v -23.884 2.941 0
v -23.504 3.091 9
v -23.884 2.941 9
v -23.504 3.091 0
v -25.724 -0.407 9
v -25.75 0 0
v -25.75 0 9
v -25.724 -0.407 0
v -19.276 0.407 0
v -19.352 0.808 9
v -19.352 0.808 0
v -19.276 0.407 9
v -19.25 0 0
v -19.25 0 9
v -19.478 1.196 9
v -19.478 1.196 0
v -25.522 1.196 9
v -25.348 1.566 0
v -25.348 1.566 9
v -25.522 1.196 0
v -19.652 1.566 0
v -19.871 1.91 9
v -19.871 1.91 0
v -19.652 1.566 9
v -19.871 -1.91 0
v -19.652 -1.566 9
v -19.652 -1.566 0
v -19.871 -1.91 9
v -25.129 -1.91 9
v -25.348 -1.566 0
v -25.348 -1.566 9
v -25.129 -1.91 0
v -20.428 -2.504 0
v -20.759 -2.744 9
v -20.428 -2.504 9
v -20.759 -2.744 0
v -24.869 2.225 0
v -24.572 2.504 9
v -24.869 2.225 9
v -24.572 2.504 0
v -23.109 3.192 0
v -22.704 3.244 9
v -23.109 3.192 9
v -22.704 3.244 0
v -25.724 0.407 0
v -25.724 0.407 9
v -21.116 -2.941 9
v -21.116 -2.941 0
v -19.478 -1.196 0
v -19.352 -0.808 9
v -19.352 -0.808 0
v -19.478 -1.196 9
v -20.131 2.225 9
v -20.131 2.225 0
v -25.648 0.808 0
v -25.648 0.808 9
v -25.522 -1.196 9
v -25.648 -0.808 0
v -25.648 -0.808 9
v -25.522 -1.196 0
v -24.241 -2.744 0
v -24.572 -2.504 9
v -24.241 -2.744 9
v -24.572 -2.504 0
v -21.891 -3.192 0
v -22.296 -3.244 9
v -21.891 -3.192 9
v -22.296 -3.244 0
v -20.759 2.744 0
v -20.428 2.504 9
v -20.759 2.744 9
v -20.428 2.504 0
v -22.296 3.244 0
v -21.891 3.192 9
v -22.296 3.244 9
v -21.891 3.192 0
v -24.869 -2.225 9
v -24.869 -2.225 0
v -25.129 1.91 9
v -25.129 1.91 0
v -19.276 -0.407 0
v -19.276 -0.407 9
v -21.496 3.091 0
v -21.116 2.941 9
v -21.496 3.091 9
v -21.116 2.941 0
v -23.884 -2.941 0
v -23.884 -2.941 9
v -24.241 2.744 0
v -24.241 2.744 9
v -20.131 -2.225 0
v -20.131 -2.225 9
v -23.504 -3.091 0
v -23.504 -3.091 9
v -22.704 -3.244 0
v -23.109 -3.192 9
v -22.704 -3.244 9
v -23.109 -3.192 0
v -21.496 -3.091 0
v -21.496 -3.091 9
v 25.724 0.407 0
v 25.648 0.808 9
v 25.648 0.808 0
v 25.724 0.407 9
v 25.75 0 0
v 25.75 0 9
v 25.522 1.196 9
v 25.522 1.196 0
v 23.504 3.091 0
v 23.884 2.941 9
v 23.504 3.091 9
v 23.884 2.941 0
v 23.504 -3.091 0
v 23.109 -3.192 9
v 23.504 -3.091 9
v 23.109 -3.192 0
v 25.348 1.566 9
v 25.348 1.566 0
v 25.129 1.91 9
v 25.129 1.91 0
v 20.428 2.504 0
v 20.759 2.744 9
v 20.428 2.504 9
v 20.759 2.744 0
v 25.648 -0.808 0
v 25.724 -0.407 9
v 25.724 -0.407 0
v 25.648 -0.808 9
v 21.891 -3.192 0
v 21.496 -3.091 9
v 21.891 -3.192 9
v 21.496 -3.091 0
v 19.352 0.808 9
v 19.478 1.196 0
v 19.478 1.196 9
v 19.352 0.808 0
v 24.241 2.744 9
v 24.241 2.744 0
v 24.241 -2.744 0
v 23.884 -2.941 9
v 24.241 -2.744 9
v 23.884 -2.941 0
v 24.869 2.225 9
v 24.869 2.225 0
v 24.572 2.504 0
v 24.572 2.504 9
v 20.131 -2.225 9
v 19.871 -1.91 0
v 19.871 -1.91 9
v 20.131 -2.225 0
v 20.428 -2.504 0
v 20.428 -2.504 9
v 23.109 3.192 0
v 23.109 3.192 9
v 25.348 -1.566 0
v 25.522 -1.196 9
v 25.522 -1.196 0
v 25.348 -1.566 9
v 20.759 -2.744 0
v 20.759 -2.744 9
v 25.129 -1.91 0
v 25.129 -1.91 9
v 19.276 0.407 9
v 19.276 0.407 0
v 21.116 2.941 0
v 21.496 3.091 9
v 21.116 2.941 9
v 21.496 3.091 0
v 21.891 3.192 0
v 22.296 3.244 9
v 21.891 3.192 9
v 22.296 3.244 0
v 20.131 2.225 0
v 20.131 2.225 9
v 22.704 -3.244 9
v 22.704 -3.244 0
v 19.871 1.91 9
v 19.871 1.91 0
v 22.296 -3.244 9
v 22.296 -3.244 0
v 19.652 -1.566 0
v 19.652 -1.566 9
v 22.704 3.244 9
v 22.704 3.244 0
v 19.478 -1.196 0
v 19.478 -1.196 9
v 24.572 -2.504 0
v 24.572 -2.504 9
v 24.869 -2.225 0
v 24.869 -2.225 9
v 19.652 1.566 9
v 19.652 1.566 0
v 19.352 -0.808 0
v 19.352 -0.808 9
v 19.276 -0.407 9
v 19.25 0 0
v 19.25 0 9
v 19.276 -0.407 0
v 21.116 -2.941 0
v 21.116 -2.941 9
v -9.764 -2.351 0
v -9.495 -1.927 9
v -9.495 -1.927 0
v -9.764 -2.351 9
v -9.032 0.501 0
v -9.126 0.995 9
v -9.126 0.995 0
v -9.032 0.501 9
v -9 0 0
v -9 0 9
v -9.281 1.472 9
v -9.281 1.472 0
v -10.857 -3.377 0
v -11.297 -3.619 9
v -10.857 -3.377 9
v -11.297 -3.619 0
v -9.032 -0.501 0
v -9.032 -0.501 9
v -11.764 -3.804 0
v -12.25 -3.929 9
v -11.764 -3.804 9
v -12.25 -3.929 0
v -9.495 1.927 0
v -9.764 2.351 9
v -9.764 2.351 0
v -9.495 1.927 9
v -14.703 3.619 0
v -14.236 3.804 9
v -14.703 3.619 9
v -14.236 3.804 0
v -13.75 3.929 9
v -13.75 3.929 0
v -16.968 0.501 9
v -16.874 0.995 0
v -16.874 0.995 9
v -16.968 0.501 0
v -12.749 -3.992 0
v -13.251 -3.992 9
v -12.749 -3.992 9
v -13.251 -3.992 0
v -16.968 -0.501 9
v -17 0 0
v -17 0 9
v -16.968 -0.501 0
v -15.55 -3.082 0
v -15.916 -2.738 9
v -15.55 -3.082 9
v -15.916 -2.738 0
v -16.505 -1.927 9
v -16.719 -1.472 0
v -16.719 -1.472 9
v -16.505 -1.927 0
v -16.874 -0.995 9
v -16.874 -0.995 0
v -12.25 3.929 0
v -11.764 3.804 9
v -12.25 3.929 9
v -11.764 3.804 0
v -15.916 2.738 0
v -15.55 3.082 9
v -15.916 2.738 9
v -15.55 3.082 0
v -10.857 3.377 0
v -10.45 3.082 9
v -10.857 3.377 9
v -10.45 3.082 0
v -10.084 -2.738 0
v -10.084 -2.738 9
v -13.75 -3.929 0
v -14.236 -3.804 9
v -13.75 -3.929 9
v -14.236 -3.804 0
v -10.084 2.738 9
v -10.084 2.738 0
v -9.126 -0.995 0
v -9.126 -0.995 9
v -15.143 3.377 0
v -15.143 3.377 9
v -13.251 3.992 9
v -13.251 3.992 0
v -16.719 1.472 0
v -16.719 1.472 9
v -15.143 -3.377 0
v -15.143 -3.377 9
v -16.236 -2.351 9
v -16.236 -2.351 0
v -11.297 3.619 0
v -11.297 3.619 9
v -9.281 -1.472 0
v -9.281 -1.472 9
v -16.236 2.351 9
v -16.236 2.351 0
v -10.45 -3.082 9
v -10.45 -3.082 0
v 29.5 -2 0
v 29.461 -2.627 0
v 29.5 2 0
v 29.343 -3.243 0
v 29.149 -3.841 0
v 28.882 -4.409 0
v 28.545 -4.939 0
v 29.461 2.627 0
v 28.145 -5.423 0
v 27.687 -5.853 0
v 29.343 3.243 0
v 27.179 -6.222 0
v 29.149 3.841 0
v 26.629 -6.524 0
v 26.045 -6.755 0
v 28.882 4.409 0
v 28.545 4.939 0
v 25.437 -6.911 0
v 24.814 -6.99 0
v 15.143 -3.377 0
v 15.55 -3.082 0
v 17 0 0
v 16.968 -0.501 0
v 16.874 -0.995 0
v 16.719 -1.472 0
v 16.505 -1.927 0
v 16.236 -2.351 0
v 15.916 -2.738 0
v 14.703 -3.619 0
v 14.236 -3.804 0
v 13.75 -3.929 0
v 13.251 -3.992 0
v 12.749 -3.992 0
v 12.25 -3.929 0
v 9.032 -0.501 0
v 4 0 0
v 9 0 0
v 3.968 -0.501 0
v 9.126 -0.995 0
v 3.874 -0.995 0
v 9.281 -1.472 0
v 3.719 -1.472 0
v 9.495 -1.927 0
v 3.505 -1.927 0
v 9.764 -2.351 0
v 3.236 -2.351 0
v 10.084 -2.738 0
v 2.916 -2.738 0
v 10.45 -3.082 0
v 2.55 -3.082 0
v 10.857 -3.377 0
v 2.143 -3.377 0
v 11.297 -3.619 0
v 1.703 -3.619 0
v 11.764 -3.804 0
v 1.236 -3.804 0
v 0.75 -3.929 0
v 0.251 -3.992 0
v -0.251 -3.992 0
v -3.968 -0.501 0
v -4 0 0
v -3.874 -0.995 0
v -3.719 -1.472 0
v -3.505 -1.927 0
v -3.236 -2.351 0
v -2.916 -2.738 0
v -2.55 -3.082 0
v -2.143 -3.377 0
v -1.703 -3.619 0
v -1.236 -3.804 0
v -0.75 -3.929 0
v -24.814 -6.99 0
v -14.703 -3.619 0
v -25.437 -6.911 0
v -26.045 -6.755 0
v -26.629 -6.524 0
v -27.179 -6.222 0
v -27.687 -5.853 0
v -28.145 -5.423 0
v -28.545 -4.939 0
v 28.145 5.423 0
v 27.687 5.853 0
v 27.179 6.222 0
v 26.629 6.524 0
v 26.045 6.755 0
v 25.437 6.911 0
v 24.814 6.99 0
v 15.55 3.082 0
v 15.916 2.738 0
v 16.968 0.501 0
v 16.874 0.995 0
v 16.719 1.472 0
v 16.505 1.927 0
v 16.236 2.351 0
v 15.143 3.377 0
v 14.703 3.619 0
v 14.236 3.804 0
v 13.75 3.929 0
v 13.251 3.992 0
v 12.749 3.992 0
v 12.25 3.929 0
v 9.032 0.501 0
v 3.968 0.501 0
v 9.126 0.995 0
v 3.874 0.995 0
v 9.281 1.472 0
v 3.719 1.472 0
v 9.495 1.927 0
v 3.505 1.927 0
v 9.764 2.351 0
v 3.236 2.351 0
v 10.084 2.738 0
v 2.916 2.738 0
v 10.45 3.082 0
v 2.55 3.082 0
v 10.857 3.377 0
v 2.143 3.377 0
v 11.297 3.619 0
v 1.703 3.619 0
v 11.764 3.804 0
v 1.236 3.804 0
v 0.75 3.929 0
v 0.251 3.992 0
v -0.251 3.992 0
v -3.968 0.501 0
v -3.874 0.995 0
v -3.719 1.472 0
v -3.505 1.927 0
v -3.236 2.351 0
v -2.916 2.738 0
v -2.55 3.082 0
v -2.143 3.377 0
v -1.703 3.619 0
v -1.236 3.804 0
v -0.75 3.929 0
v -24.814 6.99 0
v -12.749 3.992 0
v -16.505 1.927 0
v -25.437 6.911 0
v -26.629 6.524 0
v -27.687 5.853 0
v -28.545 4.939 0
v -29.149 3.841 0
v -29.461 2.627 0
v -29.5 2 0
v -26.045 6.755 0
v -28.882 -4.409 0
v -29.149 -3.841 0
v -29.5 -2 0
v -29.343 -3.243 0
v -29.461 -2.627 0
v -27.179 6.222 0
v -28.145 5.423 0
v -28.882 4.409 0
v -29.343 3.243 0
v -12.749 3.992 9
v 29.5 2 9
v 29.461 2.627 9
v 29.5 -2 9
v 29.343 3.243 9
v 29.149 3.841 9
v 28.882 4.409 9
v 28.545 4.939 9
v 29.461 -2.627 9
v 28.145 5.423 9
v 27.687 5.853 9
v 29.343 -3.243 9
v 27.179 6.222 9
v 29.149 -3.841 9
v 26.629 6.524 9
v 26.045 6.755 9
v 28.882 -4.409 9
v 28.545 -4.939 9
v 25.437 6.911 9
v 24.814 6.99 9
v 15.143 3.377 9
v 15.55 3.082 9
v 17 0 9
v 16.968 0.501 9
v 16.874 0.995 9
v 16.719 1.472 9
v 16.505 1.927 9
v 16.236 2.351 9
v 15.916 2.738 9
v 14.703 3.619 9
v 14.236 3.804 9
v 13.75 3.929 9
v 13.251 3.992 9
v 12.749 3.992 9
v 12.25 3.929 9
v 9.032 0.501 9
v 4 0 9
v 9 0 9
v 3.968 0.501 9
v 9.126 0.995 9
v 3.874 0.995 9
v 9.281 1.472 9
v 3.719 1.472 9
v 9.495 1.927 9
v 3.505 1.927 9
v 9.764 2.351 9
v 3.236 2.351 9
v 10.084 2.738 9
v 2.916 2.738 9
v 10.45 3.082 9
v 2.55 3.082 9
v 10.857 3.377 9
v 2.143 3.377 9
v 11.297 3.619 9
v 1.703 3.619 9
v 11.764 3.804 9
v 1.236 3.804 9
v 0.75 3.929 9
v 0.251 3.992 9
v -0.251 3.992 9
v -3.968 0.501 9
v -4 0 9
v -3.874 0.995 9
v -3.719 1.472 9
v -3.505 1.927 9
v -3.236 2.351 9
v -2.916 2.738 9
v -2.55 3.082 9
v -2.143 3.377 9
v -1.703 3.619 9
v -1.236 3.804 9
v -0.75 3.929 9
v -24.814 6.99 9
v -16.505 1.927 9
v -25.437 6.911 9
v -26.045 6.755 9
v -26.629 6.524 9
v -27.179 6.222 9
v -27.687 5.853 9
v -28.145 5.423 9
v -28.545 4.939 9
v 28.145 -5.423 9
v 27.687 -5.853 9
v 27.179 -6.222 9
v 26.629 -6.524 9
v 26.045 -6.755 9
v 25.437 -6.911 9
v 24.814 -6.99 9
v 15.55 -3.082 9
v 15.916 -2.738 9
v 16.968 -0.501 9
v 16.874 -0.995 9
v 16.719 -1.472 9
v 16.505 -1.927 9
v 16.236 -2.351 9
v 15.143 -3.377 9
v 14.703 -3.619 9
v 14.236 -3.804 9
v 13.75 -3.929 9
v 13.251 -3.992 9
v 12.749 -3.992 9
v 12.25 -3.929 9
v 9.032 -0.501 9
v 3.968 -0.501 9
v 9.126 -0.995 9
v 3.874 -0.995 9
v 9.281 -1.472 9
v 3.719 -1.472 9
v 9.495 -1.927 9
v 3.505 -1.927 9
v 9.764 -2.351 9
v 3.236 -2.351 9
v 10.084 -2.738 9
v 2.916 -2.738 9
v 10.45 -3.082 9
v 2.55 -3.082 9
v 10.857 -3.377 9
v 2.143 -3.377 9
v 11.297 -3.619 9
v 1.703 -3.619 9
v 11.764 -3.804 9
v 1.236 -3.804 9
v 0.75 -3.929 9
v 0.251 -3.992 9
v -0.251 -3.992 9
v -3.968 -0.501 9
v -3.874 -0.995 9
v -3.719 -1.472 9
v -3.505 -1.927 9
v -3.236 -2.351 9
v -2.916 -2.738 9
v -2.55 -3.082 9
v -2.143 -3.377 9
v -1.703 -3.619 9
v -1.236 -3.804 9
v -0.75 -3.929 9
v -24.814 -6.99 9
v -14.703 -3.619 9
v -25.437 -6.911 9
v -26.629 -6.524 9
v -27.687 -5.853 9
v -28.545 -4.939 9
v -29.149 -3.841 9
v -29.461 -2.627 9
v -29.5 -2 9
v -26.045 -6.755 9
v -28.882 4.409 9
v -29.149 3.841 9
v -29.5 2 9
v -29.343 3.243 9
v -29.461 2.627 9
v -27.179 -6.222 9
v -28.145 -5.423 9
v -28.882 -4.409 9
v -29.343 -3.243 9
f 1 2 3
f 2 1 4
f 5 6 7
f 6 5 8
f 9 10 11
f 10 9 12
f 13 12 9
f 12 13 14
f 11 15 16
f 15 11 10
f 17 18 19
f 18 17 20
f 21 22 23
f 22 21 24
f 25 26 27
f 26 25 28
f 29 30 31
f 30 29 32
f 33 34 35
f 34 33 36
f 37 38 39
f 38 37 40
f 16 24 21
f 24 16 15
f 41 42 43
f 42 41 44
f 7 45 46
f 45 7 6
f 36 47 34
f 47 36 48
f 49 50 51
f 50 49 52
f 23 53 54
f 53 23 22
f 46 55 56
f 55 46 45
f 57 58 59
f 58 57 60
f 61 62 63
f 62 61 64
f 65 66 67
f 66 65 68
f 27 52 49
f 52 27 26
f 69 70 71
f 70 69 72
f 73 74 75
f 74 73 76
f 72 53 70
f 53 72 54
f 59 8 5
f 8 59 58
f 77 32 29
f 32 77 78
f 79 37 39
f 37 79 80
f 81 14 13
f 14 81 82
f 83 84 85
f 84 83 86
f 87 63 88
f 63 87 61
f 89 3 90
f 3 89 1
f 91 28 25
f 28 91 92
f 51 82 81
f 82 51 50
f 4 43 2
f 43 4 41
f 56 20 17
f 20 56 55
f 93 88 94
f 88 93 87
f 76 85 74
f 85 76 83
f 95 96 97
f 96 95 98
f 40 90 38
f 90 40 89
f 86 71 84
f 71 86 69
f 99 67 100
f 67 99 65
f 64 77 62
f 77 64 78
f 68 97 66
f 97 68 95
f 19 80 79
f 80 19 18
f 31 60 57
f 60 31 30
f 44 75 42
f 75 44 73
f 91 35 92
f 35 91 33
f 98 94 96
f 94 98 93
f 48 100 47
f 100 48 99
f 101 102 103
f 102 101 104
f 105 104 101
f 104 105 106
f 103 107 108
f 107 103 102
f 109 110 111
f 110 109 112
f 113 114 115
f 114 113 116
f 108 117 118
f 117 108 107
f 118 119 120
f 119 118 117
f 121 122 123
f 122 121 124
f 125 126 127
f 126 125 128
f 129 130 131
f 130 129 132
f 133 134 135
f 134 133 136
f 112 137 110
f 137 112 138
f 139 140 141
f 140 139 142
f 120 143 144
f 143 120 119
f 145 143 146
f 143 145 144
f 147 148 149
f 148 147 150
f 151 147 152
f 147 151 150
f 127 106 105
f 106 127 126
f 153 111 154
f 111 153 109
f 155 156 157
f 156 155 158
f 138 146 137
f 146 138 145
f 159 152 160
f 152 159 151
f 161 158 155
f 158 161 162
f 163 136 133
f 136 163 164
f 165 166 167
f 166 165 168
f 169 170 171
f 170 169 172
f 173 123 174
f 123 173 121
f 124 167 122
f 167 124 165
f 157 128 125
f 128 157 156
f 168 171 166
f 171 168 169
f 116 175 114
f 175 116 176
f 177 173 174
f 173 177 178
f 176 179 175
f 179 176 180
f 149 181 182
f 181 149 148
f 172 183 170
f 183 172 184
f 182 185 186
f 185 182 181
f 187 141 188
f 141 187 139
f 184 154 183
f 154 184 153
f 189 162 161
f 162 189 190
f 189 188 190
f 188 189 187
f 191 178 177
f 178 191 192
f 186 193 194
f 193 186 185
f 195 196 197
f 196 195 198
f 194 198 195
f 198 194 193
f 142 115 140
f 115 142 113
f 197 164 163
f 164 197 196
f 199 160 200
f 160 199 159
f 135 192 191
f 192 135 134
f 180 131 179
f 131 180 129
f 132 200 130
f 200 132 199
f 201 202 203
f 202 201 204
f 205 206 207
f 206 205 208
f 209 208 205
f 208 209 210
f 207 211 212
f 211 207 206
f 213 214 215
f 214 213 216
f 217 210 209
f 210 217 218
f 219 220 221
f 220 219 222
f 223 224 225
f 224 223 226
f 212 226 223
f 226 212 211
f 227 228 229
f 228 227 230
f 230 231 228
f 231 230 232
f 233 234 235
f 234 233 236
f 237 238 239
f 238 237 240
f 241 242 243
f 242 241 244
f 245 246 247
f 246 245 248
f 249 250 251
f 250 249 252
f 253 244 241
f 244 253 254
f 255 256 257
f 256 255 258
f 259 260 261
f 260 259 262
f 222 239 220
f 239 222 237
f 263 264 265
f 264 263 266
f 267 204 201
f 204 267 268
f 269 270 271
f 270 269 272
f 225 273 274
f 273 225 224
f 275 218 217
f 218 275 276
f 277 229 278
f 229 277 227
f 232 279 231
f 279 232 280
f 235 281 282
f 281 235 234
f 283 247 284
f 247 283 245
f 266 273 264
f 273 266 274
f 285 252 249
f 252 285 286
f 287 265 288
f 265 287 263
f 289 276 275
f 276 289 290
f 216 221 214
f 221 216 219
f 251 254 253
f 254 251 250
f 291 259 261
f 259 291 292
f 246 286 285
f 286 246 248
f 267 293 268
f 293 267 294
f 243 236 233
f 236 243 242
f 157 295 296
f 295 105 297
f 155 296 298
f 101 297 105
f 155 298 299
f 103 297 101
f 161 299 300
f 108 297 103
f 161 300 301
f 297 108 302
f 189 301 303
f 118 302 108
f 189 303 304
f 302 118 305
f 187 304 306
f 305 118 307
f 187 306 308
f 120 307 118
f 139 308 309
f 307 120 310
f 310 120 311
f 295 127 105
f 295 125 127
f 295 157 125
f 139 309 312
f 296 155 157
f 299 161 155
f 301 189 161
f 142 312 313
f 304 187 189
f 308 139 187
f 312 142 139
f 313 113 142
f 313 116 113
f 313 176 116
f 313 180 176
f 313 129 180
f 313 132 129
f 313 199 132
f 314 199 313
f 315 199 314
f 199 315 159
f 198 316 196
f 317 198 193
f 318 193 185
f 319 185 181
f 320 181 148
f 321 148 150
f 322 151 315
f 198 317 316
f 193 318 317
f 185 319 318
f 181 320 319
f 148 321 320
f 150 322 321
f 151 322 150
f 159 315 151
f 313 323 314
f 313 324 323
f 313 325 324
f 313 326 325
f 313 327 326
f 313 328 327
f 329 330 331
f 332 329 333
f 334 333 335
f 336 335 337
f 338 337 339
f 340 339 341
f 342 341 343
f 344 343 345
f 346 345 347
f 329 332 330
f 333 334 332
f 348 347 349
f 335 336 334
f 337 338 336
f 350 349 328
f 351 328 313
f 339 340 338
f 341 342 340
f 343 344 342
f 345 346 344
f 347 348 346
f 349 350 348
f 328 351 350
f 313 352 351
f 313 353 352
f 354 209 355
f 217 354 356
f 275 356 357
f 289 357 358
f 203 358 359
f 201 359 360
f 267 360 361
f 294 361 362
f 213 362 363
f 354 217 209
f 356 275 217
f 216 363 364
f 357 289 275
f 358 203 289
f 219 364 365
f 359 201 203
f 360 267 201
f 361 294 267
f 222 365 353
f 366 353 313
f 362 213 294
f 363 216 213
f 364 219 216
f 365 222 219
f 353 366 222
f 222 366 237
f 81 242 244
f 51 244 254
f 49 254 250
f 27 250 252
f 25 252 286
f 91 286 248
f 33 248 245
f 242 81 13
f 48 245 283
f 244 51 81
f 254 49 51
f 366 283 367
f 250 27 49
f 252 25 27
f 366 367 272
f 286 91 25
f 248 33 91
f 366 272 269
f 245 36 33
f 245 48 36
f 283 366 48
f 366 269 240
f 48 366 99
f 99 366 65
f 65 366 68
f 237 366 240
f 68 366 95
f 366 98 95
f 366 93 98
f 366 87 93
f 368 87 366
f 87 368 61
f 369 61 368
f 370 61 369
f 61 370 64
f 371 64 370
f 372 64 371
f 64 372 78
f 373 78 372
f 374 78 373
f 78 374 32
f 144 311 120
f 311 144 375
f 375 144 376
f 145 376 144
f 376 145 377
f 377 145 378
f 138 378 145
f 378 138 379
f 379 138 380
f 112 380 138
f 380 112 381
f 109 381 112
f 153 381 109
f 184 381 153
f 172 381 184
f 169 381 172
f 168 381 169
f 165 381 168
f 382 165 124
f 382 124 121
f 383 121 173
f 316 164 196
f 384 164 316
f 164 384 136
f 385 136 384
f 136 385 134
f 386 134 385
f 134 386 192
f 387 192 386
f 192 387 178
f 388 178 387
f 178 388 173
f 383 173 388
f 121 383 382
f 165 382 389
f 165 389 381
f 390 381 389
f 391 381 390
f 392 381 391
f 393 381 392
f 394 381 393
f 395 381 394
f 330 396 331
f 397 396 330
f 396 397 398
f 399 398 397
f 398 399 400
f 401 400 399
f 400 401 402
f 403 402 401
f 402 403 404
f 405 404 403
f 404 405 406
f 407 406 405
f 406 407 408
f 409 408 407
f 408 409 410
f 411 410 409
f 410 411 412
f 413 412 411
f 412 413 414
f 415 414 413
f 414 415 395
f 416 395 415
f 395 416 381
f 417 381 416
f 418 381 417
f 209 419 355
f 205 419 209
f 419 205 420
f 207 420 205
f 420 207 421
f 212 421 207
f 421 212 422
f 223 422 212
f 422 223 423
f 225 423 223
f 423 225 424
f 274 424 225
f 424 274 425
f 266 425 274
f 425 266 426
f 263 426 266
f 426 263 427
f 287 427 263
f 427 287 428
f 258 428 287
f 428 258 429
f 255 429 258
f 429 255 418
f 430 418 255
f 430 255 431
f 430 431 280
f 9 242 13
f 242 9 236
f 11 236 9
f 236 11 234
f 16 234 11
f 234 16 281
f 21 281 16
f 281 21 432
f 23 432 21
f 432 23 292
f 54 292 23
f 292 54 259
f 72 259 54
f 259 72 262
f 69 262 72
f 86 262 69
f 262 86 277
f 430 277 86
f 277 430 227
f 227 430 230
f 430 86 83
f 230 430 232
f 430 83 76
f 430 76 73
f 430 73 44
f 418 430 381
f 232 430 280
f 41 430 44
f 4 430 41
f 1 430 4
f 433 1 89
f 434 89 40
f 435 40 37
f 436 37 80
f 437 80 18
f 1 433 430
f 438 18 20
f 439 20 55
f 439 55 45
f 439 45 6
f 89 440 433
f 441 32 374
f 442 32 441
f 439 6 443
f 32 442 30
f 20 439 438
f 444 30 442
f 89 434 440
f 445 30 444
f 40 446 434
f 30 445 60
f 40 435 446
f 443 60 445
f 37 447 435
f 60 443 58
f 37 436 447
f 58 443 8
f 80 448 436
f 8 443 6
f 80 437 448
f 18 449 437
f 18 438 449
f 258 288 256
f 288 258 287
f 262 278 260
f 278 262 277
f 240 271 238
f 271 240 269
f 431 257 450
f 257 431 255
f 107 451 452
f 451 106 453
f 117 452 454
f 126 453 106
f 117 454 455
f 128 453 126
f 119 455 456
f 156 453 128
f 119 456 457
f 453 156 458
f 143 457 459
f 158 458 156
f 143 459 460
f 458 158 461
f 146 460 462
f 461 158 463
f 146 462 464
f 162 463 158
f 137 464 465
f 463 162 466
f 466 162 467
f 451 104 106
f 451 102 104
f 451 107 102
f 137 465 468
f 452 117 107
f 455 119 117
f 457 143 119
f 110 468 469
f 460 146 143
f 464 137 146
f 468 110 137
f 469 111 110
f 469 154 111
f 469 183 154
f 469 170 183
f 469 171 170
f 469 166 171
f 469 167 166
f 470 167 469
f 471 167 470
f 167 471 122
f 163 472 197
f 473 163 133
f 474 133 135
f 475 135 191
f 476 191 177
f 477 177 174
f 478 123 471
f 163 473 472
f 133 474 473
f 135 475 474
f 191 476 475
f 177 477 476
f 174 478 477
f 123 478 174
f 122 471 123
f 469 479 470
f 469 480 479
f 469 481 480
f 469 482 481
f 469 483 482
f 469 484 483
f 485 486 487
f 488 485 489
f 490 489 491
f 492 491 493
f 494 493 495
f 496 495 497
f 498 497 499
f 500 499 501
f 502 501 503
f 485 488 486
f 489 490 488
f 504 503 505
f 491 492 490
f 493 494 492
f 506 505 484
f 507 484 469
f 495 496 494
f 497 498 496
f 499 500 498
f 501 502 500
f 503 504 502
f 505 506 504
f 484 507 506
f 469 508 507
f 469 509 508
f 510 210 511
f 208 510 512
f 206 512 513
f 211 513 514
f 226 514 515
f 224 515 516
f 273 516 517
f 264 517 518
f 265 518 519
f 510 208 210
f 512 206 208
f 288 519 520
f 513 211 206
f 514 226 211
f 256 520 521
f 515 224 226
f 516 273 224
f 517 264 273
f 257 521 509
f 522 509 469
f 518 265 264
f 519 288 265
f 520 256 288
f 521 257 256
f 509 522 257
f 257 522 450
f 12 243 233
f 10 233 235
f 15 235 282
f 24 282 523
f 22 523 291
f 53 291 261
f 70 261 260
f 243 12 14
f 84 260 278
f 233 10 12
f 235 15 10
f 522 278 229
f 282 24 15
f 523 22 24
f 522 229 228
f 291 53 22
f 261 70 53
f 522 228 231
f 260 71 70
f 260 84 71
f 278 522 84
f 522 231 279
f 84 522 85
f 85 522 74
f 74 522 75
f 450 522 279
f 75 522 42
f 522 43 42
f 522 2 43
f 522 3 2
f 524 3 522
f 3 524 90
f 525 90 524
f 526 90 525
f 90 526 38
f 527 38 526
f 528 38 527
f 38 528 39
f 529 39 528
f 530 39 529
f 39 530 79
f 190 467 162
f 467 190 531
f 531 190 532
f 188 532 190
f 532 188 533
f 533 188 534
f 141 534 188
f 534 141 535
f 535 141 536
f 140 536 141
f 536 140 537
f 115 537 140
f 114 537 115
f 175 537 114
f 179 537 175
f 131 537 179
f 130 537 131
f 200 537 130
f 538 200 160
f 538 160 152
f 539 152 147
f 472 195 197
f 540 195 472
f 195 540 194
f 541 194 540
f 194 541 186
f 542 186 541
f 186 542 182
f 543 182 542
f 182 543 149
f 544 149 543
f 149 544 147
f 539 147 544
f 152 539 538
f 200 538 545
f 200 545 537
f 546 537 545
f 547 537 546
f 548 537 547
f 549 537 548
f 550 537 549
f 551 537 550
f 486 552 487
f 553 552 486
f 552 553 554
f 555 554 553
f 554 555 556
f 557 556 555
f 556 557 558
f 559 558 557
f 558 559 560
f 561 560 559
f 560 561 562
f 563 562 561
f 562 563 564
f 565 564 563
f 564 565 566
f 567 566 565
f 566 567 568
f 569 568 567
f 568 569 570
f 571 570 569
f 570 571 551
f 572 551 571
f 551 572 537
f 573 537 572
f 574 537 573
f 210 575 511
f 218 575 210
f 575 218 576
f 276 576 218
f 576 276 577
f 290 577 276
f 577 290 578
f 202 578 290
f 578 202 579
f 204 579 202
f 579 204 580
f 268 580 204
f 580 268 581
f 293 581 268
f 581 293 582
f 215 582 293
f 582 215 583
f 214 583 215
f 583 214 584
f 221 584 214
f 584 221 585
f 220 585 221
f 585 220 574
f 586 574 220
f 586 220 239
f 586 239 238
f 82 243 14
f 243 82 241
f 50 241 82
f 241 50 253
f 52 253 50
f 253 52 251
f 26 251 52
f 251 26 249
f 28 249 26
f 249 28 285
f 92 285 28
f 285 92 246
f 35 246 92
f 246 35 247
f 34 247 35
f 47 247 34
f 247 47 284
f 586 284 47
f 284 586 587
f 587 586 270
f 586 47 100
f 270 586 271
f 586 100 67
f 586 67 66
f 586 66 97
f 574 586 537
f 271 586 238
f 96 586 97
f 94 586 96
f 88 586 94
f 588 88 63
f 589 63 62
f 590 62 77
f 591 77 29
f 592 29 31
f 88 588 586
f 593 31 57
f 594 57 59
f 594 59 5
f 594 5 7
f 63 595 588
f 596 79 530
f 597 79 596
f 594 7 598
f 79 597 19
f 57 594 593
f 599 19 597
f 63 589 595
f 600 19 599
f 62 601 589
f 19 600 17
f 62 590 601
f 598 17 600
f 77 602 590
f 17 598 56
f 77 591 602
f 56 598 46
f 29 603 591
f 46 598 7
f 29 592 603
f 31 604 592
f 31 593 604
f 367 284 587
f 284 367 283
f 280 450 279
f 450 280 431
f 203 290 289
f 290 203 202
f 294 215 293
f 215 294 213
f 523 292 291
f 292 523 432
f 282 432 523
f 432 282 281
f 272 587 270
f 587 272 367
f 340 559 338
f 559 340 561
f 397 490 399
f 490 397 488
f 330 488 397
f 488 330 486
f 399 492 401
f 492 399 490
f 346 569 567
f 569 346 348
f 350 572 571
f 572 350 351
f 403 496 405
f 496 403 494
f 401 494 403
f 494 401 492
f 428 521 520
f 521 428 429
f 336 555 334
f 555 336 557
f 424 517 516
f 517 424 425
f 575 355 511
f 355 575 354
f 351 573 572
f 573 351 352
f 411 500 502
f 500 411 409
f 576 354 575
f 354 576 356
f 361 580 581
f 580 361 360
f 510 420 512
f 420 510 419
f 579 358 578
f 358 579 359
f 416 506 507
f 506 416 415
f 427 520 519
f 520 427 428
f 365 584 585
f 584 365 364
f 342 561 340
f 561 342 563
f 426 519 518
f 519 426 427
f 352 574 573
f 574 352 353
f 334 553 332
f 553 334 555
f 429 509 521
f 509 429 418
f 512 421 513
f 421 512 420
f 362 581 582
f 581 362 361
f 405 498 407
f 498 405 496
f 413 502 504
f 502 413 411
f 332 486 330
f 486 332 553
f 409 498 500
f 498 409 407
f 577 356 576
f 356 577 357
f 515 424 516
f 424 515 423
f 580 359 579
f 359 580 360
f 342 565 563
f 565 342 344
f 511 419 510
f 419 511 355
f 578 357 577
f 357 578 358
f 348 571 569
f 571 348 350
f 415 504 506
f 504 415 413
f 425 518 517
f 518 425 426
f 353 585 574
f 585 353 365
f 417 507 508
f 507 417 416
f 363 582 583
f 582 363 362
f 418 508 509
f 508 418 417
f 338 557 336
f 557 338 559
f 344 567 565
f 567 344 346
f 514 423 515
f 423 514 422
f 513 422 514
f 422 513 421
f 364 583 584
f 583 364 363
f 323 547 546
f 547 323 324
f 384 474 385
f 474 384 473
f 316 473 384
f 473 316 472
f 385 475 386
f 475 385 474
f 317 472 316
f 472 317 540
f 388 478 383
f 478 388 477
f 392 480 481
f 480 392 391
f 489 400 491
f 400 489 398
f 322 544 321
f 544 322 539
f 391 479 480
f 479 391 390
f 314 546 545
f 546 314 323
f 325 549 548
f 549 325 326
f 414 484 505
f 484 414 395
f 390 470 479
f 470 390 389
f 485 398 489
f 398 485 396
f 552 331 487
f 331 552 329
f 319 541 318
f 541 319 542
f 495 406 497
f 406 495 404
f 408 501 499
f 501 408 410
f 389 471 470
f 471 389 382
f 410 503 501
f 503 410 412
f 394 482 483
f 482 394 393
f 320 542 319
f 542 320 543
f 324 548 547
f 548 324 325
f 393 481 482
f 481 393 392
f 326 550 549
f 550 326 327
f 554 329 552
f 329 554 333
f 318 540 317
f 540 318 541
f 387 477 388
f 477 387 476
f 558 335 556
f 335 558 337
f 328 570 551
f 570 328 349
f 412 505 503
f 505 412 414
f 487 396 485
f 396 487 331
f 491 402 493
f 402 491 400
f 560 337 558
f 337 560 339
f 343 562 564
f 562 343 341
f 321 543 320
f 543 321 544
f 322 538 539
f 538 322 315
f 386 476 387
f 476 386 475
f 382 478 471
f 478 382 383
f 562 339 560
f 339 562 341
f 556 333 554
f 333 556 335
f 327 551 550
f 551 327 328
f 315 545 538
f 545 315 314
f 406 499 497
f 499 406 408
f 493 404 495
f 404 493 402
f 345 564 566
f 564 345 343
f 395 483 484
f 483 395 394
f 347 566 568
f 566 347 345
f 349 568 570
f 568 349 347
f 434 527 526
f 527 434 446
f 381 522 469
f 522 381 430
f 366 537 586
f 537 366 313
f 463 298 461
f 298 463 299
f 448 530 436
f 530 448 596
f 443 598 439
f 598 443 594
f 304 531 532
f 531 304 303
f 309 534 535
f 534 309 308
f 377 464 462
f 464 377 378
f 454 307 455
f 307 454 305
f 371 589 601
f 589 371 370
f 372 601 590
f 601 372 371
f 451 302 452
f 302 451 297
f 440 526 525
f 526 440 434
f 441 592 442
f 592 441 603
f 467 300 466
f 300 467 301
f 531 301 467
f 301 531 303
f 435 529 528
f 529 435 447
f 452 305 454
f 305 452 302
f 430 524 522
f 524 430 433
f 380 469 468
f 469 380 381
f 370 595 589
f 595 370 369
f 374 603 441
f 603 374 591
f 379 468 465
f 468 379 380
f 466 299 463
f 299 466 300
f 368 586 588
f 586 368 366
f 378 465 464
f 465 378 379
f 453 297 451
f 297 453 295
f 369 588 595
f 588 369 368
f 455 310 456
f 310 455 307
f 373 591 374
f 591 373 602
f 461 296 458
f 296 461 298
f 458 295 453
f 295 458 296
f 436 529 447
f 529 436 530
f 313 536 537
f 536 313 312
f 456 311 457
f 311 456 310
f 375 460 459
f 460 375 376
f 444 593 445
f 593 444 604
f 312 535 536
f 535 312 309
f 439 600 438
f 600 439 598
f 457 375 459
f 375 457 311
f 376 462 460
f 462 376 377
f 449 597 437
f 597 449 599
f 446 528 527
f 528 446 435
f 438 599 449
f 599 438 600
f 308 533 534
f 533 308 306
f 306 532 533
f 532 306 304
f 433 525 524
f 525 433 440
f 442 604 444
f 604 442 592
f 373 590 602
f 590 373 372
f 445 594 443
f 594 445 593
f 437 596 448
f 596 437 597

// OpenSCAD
$fn = 50;


difference() {
	union() {
		hull() {
			translate(v = [-24.5000000000, 2.0000000000, 0]) {
				cylinder(h = 9, r = 5);
			}
			translate(v = [24.5000000000, 2.0000000000, 0]) {
				cylinder(h = 9, r = 5);
			}
			translate(v = [-24.5000000000, -2.0000000000, 0]) {
				cylinder(h = 9, r = 5);
			}
			translate(v = [24.5000000000, -2.0000000000, 0]) {
				cylinder(h = 9, r = 5);
			}
		}
	}
	union() {
		#translate(v = [-22.5000000000, 0.0000000000, 0]) {
			cylinder(h = 9, r = 3.2500000000);
		}
		#translate(v = [22.5000000000, 0.0000000000, 0]) {
			cylinder(h = 9, r = 3.2500000000);
		}
		#translate(v = [-22.5000000000, 0.0000000000, -100.0000000000]) {
			cylinder(h = 200, r = 3.2500000000);
		}
		#translate(v = [-22.5000000000, 0.0000000000, -100.0000000000]) {
			cylinder(h = 200, r = 3.2500000000);
		}
		#translate(v = [22.5000000000, 0.0000000000, -100.0000000000]) {
			cylinder(h = 200, r = 3.2500000000);
		}
		#translate(v = [22.5000000000, 0.0000000000, -100.0000000000]) {
			cylinder(h = 200, r = 3.2500000000);
		}
		#translate(v = [-22.5000000000, 0.0000000000, 0]) {
			cylinder(h = 9, r = 1.8000000000);
		}
		#translate(v = [22.5000000000, 0.0000000000, 0]) {
			cylinder(h = 9, r = 1.8000000000);
		}
		#translate(v = [-22.5000000000, 0.0000000000, 0]) {
			cylinder(h = 9, r = 1.8000000000);
		}
		#translate(v = [22.5000000000, 0.0000000000, 0]) {
			cylinder(h = 9, r = 1.8000000000);
		}
		#translate(v = [-22.5000000000, 0.0000000000, 0]) {
			cylinder(h = 9, r = 1.8000000000);
		}
		#translate(v = [22.5000000000, 0.0000000000, 0]) {
			cylinder(h = 9, r = 1.8000000000);
		}
		#translate(v = [-13.0000000000, 0, 0]) {
			cylinder(h = 9, r = 4.0000000000);
		}
		#cylinder(h = 9, r = 4.0000000000);
		#translate(v = [13.0000000000, 0, 0]) {
			cylinder(h = 9, r = 4.0000000000);
		}
	}
}
